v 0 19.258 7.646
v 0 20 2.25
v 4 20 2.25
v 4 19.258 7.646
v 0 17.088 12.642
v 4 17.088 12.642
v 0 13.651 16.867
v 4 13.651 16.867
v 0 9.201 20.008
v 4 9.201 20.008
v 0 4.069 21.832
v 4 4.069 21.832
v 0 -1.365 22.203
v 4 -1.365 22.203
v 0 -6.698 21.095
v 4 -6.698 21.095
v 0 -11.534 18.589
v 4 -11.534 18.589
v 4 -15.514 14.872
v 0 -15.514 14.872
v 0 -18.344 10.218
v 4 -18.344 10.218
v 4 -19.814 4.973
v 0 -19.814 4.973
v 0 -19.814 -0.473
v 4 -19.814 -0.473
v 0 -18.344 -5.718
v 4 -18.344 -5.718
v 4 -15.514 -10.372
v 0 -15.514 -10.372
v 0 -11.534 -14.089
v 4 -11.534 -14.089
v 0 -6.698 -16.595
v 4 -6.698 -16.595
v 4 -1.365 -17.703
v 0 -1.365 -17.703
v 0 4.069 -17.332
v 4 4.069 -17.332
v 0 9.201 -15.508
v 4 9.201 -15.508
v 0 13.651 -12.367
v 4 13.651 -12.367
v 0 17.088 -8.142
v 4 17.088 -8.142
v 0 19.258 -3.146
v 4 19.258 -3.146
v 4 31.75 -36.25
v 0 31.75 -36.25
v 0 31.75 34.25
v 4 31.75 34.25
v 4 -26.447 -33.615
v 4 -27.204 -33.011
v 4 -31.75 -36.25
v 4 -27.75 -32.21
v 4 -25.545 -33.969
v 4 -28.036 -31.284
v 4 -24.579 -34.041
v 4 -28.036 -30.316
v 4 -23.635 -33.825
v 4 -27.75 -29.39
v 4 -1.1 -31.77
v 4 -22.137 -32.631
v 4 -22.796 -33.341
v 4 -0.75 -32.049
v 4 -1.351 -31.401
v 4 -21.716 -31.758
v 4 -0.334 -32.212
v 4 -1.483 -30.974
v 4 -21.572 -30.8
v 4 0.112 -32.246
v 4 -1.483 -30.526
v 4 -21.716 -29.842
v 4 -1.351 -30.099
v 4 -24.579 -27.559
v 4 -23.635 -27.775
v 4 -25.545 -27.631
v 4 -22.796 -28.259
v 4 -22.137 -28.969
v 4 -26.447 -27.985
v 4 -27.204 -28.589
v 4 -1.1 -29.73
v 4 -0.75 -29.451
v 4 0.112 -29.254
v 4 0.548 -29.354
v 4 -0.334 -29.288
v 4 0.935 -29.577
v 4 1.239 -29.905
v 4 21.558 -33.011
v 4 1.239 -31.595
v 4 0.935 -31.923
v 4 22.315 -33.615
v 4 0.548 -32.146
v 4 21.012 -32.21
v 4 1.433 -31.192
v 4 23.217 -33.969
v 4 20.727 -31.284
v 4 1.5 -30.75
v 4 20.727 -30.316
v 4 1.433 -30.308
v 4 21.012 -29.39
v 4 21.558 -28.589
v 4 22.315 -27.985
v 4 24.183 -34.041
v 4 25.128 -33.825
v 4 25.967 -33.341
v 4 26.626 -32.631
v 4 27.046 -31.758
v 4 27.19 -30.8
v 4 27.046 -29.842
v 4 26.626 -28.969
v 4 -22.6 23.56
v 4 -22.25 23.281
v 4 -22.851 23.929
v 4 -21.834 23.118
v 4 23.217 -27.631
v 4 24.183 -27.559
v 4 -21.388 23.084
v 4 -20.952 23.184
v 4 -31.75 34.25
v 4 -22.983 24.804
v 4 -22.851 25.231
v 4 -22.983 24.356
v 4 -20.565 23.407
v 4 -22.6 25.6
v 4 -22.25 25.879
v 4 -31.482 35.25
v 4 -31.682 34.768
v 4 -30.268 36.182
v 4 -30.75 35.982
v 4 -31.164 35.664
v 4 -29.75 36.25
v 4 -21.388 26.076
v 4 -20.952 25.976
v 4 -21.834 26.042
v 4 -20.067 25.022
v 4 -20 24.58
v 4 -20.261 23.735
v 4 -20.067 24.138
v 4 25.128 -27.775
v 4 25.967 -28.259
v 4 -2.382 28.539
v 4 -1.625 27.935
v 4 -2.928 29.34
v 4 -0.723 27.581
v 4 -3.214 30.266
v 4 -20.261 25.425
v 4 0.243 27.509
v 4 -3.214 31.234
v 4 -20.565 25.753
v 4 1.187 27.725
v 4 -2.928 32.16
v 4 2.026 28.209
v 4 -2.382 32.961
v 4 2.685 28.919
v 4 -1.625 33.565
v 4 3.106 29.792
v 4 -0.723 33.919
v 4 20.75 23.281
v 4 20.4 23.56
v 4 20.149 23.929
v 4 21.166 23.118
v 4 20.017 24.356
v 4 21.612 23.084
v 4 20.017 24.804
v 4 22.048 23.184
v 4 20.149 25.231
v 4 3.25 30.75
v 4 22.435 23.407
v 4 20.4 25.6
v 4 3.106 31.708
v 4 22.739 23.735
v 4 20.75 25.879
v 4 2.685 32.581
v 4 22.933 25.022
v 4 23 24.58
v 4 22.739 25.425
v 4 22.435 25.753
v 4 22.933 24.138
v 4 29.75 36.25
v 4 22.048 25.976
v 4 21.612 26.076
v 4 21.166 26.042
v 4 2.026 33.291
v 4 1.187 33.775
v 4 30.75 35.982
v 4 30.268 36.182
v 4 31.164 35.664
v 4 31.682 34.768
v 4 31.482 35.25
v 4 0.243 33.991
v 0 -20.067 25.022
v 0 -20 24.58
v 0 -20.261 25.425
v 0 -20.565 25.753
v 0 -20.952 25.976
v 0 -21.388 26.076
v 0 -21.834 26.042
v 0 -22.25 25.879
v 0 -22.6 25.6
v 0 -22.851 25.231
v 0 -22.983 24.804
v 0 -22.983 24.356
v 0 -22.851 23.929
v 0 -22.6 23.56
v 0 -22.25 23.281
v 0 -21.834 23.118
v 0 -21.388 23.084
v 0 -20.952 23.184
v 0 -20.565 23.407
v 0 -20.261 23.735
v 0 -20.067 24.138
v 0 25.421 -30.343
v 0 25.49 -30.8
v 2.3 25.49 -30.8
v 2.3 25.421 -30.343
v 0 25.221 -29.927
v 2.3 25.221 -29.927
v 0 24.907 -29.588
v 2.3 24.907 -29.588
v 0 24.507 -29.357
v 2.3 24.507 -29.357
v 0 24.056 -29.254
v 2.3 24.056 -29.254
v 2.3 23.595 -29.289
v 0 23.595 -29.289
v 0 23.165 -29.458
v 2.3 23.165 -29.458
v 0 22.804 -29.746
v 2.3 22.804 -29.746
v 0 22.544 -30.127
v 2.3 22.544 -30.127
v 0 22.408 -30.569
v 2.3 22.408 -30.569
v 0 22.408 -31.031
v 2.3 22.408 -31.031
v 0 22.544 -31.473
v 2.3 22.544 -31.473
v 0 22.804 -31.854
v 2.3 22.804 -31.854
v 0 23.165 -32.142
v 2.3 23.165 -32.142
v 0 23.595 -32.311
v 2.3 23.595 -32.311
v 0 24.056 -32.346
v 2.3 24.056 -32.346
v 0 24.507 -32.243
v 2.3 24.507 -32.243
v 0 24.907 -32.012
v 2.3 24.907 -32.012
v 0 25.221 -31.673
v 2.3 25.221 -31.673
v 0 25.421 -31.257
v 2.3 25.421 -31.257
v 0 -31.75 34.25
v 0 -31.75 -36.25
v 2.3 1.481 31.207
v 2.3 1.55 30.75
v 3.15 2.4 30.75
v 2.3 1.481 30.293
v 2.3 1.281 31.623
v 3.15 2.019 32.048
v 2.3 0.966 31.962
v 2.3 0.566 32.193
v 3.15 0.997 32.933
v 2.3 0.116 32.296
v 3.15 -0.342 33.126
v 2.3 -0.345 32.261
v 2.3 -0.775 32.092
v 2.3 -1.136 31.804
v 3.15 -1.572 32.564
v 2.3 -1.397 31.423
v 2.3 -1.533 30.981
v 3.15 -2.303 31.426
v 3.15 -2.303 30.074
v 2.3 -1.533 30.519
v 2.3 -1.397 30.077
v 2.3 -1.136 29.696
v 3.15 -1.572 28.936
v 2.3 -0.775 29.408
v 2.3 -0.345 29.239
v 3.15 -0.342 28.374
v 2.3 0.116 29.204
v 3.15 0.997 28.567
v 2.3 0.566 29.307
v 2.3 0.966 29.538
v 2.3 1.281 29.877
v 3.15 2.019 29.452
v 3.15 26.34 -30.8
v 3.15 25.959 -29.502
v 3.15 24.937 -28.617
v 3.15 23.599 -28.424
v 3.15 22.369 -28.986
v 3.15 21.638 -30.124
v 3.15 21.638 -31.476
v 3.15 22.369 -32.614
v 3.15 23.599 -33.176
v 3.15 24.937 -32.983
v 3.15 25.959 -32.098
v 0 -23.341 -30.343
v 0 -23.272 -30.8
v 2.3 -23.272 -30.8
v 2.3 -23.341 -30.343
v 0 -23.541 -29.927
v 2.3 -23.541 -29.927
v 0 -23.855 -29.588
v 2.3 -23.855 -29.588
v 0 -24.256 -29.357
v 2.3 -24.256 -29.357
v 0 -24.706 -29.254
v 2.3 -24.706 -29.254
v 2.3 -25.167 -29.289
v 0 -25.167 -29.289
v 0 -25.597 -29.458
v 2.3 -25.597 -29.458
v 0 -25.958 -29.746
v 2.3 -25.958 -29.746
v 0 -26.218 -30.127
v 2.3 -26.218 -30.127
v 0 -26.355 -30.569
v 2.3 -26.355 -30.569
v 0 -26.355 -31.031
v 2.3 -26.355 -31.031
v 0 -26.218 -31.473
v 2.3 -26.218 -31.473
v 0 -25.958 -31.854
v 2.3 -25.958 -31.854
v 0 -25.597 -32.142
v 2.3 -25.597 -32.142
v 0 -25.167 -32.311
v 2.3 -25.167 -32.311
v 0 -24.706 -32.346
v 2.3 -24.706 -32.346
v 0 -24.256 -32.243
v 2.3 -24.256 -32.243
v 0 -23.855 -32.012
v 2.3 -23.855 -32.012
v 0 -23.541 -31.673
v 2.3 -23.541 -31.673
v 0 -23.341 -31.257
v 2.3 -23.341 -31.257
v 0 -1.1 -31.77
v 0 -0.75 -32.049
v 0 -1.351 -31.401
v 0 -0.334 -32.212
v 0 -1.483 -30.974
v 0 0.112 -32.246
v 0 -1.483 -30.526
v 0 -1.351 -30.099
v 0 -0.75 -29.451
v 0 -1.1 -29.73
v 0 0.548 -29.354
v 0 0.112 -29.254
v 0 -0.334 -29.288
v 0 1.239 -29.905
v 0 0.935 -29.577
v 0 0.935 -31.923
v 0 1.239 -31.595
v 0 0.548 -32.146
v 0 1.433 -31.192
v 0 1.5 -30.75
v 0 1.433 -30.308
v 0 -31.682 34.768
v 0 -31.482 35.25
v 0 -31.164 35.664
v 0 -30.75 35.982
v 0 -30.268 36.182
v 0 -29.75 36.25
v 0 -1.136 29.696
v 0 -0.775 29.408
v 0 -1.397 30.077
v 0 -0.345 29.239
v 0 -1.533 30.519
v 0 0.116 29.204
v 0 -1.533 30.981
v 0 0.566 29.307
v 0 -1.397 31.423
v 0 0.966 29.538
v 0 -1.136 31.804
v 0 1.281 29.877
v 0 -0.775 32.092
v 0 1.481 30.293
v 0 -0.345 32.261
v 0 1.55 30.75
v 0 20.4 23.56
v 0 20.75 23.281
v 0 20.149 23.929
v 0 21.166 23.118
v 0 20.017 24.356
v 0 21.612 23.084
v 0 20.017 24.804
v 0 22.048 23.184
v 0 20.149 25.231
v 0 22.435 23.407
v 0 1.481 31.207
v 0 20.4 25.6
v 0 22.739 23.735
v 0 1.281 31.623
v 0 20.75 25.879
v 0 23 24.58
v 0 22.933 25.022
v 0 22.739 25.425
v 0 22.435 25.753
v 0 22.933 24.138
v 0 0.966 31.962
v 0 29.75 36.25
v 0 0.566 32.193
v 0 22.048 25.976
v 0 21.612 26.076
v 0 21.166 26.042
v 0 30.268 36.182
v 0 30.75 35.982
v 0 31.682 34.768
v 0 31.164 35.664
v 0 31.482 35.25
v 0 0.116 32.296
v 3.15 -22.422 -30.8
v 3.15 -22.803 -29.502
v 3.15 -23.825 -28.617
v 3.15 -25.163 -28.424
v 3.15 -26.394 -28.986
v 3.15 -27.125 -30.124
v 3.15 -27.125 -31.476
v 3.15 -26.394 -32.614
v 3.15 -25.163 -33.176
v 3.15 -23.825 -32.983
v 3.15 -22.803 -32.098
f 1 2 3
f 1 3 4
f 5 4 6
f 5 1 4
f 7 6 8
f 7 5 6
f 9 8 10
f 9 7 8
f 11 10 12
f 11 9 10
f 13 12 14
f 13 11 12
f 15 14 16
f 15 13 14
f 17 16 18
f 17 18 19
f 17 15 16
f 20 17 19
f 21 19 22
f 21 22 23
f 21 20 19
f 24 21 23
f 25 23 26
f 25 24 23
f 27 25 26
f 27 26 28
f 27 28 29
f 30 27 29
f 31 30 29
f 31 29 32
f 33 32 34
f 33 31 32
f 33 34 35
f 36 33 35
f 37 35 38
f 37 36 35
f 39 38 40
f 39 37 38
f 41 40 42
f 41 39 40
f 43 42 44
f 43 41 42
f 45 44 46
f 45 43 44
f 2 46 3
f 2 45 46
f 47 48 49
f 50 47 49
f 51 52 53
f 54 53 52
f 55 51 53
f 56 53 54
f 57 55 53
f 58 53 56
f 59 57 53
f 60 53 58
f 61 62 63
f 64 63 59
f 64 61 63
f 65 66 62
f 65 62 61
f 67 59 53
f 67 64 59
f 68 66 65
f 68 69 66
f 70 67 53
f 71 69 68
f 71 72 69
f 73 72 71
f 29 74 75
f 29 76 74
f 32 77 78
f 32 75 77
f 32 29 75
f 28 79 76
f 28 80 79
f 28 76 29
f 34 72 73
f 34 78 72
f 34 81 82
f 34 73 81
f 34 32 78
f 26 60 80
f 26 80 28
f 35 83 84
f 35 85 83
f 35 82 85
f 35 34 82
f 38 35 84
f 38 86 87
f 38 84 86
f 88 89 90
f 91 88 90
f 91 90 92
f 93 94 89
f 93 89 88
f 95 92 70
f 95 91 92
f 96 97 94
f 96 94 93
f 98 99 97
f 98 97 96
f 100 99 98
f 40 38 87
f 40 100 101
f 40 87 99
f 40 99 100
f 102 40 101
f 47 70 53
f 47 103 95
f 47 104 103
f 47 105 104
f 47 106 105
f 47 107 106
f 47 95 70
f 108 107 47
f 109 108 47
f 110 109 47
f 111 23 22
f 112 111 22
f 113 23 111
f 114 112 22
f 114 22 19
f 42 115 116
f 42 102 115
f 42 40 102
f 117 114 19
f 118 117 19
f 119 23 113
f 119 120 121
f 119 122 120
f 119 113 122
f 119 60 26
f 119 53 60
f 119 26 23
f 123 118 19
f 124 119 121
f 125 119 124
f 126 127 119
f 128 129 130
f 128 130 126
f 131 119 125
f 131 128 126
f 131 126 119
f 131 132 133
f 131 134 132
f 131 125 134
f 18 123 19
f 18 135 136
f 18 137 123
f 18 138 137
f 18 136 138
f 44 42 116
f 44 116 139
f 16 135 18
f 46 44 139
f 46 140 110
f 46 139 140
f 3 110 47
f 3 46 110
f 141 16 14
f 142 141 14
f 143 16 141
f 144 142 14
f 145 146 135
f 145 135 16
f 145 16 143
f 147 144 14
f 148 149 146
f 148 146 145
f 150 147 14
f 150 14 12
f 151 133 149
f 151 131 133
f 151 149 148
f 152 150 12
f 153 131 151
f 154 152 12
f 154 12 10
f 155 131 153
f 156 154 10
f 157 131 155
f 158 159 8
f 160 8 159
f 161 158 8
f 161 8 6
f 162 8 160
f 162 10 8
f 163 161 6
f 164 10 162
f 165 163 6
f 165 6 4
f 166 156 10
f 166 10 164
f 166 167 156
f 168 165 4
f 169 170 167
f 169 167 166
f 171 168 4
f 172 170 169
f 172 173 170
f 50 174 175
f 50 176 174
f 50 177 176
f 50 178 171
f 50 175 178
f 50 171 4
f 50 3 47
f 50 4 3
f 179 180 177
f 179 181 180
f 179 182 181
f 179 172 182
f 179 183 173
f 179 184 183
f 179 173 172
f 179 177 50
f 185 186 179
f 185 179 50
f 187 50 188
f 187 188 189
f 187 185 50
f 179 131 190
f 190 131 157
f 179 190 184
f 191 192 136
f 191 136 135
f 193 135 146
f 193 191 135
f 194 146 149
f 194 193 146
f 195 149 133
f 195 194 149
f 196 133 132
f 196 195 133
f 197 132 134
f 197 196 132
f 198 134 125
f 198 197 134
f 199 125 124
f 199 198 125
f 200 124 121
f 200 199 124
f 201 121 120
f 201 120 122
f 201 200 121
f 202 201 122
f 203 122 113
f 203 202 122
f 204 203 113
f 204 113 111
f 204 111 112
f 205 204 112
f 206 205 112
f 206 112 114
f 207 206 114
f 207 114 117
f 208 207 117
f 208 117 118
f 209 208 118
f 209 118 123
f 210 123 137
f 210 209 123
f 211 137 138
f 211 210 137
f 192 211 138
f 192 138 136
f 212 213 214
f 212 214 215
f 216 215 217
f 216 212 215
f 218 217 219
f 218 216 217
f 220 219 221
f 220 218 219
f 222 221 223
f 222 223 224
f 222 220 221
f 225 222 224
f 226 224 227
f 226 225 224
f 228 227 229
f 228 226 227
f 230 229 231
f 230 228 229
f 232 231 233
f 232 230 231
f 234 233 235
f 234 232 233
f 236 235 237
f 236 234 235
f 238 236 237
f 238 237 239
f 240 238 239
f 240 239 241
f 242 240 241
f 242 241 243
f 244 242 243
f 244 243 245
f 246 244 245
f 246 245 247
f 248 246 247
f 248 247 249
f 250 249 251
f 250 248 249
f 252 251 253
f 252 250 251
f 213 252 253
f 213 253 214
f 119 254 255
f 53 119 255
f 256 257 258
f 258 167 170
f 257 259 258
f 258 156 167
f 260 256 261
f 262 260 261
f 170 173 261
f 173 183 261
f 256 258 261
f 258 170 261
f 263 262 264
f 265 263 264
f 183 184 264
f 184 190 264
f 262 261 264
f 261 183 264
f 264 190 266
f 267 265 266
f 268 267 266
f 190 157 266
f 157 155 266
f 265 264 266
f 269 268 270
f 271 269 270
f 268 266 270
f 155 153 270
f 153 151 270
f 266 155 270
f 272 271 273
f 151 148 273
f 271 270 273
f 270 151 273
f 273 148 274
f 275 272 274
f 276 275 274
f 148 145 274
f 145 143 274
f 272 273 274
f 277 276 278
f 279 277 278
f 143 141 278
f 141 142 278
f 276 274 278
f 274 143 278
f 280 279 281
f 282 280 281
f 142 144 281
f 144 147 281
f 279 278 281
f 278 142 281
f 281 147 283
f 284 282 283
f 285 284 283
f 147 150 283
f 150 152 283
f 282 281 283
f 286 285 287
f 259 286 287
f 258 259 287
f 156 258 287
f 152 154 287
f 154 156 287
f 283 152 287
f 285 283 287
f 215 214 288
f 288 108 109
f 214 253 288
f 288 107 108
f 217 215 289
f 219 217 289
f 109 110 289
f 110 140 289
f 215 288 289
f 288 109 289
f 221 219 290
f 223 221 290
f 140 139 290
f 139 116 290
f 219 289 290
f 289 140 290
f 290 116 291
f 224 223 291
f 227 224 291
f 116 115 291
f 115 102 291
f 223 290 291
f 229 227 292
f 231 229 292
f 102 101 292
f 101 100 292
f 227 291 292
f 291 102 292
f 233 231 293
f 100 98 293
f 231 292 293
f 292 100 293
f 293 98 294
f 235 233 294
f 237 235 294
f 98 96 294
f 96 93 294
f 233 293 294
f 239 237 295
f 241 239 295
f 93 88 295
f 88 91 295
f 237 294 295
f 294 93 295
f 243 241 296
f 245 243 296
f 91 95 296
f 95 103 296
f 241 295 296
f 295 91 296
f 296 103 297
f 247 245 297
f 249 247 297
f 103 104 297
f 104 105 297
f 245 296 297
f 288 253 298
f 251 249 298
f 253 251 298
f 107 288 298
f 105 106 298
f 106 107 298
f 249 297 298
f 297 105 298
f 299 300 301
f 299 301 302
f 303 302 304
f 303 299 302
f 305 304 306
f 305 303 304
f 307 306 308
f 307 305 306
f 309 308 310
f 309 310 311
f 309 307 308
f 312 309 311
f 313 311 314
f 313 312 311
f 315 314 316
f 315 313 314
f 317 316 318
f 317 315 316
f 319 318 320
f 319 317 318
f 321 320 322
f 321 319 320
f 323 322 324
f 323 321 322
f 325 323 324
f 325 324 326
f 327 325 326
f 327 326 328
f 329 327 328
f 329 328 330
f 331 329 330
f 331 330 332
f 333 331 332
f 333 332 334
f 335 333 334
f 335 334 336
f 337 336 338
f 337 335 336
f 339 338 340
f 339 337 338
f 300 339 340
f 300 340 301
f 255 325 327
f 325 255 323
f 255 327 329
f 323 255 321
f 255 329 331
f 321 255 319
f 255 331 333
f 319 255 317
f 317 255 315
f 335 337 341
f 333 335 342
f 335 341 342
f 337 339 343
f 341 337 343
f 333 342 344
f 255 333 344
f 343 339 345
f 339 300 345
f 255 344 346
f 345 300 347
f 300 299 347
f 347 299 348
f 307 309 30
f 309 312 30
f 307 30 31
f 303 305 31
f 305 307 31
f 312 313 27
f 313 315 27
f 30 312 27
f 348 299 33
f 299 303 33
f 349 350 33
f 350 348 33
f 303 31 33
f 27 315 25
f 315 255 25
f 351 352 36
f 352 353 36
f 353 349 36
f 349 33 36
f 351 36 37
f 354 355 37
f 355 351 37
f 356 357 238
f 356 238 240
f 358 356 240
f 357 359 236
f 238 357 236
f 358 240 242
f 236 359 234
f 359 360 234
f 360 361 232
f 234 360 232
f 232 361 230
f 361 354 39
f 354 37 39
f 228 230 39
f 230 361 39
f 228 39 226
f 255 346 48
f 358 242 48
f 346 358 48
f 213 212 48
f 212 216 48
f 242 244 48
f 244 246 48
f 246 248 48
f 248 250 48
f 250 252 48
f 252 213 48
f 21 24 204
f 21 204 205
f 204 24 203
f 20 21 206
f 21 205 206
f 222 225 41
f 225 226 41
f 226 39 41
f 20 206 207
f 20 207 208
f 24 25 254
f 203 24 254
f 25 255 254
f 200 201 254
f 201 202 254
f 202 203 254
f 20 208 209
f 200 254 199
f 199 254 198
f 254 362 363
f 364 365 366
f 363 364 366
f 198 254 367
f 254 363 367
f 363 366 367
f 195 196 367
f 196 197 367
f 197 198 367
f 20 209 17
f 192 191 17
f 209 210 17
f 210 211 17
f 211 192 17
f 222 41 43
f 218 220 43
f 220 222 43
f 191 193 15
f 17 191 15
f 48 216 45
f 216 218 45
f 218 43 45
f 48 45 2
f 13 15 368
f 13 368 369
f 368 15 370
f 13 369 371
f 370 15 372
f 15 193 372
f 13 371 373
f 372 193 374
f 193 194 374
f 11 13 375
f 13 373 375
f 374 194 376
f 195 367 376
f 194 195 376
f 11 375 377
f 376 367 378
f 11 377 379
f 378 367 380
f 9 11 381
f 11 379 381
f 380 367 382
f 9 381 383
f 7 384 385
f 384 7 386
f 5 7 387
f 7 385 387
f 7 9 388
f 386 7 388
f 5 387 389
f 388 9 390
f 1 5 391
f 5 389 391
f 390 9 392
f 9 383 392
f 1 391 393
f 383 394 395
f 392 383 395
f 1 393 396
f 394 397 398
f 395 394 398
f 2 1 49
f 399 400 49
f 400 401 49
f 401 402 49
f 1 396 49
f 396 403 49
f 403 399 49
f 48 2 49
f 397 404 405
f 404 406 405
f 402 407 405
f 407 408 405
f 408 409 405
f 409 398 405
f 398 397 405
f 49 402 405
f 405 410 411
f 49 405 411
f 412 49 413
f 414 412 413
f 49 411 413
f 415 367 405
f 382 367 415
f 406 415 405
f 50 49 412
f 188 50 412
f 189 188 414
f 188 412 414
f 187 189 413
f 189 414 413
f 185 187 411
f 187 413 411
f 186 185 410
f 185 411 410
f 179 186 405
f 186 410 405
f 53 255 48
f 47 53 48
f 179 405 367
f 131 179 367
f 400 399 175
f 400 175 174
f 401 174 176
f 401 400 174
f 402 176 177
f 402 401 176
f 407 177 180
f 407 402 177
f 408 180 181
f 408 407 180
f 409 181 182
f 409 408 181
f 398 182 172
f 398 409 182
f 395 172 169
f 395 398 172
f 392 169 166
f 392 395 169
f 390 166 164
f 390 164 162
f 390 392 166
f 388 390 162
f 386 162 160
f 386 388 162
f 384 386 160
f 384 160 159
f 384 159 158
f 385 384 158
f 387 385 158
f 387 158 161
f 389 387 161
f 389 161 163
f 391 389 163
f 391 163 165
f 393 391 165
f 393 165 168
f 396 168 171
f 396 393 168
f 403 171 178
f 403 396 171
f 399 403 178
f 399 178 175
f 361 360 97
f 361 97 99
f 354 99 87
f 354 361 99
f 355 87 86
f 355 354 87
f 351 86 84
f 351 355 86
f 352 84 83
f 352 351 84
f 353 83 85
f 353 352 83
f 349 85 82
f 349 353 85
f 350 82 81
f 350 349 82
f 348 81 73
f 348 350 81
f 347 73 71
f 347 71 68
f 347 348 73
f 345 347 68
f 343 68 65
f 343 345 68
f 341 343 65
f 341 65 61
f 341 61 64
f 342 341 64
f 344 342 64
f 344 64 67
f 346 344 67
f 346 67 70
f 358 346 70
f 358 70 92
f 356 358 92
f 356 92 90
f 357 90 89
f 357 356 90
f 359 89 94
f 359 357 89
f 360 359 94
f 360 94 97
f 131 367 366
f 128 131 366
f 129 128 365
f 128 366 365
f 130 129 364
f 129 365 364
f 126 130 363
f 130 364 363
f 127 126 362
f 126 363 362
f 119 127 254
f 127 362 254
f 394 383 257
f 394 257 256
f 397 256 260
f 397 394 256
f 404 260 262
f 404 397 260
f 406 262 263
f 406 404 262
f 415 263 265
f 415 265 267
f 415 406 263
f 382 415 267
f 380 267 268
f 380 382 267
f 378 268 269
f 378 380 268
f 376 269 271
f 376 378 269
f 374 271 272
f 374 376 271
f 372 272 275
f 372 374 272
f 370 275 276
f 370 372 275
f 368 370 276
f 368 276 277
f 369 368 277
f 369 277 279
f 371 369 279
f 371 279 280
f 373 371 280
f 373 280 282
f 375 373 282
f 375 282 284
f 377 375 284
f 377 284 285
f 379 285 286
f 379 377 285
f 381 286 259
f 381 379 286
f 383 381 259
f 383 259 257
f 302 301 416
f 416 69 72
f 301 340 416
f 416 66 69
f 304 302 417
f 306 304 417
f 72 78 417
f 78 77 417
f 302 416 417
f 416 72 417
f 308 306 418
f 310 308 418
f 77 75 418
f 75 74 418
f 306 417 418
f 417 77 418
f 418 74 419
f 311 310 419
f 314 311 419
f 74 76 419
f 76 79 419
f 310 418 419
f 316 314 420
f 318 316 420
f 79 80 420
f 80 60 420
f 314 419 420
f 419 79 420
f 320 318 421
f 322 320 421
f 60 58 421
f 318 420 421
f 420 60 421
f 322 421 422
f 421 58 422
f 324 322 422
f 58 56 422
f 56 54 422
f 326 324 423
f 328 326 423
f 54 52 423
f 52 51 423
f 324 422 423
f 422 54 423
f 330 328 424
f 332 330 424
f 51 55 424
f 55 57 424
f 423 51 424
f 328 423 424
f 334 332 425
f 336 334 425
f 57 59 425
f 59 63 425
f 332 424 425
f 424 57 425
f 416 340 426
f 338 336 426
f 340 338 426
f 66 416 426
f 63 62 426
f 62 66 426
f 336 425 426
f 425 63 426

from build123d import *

# Parameters (mm, degrees)
F0_R     = 1.55
F0_R_2   = 1.5
F0_R_3   = 20
F1_DEPTH = 4
F2_SIZE  = 1.7


with BuildPart() as f1:
    # F0 (on Right) → F1 (new body)
    with BuildSketch(Plane.YZ):
        with BuildLine():
            ThreePointArc((31.75, 34.25), (31.164214, 35.664214), (29.75, 36.25))
            Line((29.75, 36.25), (-29.75, 36.25))
            ThreePointArc((-29.75, 36.25), (-31.164214, 35.664214), (-31.75, 34.25))
            Line((-31.75, 34.25), (-31.75, -36.25))
            Line((-31.75, -36.25), (31.75, -36.25))
            Line((31.75, -36.25), (31.75, 34.25))
        make_face()
        with Locations((-24.821896, -30.8)):
            Circle(F0_R, mode=Mode.SUBTRACT)
        with Locations((0, -30.75)):
            Circle(F0_R_2, mode=Mode.SUBTRACT)
        with Locations((23.940323, -30.8)):
            Circle(F0_R, mode=Mode.SUBTRACT)
        with Locations((-21.5, 24.58)):
            Circle(F0_R_2, mode=Mode.SUBTRACT)
        with Locations((0, 2.25)):
            Circle(F0_R_3, mode=Mode.SUBTRACT)
        with Locations((0, 30.75)):
            Circle(F0_R, mode=Mode.SUBTRACT)
        with Locations((21.5, 24.58)):
            Circle(F0_R_2, mode=Mode.SUBTRACT)
    extrude(amount=F1_DEPTH)

    # F2
    f2_edges = [f1.edges().sort_by_distance(p)[0] for p in [
        (4, -26.371896, -30.8),
        (4, 22.390323, -30.8),
        (4, -1.55, 30.75),
    ]]
    chamfer(f2_edges, length=F2_SIZE)


solid = f1.part
